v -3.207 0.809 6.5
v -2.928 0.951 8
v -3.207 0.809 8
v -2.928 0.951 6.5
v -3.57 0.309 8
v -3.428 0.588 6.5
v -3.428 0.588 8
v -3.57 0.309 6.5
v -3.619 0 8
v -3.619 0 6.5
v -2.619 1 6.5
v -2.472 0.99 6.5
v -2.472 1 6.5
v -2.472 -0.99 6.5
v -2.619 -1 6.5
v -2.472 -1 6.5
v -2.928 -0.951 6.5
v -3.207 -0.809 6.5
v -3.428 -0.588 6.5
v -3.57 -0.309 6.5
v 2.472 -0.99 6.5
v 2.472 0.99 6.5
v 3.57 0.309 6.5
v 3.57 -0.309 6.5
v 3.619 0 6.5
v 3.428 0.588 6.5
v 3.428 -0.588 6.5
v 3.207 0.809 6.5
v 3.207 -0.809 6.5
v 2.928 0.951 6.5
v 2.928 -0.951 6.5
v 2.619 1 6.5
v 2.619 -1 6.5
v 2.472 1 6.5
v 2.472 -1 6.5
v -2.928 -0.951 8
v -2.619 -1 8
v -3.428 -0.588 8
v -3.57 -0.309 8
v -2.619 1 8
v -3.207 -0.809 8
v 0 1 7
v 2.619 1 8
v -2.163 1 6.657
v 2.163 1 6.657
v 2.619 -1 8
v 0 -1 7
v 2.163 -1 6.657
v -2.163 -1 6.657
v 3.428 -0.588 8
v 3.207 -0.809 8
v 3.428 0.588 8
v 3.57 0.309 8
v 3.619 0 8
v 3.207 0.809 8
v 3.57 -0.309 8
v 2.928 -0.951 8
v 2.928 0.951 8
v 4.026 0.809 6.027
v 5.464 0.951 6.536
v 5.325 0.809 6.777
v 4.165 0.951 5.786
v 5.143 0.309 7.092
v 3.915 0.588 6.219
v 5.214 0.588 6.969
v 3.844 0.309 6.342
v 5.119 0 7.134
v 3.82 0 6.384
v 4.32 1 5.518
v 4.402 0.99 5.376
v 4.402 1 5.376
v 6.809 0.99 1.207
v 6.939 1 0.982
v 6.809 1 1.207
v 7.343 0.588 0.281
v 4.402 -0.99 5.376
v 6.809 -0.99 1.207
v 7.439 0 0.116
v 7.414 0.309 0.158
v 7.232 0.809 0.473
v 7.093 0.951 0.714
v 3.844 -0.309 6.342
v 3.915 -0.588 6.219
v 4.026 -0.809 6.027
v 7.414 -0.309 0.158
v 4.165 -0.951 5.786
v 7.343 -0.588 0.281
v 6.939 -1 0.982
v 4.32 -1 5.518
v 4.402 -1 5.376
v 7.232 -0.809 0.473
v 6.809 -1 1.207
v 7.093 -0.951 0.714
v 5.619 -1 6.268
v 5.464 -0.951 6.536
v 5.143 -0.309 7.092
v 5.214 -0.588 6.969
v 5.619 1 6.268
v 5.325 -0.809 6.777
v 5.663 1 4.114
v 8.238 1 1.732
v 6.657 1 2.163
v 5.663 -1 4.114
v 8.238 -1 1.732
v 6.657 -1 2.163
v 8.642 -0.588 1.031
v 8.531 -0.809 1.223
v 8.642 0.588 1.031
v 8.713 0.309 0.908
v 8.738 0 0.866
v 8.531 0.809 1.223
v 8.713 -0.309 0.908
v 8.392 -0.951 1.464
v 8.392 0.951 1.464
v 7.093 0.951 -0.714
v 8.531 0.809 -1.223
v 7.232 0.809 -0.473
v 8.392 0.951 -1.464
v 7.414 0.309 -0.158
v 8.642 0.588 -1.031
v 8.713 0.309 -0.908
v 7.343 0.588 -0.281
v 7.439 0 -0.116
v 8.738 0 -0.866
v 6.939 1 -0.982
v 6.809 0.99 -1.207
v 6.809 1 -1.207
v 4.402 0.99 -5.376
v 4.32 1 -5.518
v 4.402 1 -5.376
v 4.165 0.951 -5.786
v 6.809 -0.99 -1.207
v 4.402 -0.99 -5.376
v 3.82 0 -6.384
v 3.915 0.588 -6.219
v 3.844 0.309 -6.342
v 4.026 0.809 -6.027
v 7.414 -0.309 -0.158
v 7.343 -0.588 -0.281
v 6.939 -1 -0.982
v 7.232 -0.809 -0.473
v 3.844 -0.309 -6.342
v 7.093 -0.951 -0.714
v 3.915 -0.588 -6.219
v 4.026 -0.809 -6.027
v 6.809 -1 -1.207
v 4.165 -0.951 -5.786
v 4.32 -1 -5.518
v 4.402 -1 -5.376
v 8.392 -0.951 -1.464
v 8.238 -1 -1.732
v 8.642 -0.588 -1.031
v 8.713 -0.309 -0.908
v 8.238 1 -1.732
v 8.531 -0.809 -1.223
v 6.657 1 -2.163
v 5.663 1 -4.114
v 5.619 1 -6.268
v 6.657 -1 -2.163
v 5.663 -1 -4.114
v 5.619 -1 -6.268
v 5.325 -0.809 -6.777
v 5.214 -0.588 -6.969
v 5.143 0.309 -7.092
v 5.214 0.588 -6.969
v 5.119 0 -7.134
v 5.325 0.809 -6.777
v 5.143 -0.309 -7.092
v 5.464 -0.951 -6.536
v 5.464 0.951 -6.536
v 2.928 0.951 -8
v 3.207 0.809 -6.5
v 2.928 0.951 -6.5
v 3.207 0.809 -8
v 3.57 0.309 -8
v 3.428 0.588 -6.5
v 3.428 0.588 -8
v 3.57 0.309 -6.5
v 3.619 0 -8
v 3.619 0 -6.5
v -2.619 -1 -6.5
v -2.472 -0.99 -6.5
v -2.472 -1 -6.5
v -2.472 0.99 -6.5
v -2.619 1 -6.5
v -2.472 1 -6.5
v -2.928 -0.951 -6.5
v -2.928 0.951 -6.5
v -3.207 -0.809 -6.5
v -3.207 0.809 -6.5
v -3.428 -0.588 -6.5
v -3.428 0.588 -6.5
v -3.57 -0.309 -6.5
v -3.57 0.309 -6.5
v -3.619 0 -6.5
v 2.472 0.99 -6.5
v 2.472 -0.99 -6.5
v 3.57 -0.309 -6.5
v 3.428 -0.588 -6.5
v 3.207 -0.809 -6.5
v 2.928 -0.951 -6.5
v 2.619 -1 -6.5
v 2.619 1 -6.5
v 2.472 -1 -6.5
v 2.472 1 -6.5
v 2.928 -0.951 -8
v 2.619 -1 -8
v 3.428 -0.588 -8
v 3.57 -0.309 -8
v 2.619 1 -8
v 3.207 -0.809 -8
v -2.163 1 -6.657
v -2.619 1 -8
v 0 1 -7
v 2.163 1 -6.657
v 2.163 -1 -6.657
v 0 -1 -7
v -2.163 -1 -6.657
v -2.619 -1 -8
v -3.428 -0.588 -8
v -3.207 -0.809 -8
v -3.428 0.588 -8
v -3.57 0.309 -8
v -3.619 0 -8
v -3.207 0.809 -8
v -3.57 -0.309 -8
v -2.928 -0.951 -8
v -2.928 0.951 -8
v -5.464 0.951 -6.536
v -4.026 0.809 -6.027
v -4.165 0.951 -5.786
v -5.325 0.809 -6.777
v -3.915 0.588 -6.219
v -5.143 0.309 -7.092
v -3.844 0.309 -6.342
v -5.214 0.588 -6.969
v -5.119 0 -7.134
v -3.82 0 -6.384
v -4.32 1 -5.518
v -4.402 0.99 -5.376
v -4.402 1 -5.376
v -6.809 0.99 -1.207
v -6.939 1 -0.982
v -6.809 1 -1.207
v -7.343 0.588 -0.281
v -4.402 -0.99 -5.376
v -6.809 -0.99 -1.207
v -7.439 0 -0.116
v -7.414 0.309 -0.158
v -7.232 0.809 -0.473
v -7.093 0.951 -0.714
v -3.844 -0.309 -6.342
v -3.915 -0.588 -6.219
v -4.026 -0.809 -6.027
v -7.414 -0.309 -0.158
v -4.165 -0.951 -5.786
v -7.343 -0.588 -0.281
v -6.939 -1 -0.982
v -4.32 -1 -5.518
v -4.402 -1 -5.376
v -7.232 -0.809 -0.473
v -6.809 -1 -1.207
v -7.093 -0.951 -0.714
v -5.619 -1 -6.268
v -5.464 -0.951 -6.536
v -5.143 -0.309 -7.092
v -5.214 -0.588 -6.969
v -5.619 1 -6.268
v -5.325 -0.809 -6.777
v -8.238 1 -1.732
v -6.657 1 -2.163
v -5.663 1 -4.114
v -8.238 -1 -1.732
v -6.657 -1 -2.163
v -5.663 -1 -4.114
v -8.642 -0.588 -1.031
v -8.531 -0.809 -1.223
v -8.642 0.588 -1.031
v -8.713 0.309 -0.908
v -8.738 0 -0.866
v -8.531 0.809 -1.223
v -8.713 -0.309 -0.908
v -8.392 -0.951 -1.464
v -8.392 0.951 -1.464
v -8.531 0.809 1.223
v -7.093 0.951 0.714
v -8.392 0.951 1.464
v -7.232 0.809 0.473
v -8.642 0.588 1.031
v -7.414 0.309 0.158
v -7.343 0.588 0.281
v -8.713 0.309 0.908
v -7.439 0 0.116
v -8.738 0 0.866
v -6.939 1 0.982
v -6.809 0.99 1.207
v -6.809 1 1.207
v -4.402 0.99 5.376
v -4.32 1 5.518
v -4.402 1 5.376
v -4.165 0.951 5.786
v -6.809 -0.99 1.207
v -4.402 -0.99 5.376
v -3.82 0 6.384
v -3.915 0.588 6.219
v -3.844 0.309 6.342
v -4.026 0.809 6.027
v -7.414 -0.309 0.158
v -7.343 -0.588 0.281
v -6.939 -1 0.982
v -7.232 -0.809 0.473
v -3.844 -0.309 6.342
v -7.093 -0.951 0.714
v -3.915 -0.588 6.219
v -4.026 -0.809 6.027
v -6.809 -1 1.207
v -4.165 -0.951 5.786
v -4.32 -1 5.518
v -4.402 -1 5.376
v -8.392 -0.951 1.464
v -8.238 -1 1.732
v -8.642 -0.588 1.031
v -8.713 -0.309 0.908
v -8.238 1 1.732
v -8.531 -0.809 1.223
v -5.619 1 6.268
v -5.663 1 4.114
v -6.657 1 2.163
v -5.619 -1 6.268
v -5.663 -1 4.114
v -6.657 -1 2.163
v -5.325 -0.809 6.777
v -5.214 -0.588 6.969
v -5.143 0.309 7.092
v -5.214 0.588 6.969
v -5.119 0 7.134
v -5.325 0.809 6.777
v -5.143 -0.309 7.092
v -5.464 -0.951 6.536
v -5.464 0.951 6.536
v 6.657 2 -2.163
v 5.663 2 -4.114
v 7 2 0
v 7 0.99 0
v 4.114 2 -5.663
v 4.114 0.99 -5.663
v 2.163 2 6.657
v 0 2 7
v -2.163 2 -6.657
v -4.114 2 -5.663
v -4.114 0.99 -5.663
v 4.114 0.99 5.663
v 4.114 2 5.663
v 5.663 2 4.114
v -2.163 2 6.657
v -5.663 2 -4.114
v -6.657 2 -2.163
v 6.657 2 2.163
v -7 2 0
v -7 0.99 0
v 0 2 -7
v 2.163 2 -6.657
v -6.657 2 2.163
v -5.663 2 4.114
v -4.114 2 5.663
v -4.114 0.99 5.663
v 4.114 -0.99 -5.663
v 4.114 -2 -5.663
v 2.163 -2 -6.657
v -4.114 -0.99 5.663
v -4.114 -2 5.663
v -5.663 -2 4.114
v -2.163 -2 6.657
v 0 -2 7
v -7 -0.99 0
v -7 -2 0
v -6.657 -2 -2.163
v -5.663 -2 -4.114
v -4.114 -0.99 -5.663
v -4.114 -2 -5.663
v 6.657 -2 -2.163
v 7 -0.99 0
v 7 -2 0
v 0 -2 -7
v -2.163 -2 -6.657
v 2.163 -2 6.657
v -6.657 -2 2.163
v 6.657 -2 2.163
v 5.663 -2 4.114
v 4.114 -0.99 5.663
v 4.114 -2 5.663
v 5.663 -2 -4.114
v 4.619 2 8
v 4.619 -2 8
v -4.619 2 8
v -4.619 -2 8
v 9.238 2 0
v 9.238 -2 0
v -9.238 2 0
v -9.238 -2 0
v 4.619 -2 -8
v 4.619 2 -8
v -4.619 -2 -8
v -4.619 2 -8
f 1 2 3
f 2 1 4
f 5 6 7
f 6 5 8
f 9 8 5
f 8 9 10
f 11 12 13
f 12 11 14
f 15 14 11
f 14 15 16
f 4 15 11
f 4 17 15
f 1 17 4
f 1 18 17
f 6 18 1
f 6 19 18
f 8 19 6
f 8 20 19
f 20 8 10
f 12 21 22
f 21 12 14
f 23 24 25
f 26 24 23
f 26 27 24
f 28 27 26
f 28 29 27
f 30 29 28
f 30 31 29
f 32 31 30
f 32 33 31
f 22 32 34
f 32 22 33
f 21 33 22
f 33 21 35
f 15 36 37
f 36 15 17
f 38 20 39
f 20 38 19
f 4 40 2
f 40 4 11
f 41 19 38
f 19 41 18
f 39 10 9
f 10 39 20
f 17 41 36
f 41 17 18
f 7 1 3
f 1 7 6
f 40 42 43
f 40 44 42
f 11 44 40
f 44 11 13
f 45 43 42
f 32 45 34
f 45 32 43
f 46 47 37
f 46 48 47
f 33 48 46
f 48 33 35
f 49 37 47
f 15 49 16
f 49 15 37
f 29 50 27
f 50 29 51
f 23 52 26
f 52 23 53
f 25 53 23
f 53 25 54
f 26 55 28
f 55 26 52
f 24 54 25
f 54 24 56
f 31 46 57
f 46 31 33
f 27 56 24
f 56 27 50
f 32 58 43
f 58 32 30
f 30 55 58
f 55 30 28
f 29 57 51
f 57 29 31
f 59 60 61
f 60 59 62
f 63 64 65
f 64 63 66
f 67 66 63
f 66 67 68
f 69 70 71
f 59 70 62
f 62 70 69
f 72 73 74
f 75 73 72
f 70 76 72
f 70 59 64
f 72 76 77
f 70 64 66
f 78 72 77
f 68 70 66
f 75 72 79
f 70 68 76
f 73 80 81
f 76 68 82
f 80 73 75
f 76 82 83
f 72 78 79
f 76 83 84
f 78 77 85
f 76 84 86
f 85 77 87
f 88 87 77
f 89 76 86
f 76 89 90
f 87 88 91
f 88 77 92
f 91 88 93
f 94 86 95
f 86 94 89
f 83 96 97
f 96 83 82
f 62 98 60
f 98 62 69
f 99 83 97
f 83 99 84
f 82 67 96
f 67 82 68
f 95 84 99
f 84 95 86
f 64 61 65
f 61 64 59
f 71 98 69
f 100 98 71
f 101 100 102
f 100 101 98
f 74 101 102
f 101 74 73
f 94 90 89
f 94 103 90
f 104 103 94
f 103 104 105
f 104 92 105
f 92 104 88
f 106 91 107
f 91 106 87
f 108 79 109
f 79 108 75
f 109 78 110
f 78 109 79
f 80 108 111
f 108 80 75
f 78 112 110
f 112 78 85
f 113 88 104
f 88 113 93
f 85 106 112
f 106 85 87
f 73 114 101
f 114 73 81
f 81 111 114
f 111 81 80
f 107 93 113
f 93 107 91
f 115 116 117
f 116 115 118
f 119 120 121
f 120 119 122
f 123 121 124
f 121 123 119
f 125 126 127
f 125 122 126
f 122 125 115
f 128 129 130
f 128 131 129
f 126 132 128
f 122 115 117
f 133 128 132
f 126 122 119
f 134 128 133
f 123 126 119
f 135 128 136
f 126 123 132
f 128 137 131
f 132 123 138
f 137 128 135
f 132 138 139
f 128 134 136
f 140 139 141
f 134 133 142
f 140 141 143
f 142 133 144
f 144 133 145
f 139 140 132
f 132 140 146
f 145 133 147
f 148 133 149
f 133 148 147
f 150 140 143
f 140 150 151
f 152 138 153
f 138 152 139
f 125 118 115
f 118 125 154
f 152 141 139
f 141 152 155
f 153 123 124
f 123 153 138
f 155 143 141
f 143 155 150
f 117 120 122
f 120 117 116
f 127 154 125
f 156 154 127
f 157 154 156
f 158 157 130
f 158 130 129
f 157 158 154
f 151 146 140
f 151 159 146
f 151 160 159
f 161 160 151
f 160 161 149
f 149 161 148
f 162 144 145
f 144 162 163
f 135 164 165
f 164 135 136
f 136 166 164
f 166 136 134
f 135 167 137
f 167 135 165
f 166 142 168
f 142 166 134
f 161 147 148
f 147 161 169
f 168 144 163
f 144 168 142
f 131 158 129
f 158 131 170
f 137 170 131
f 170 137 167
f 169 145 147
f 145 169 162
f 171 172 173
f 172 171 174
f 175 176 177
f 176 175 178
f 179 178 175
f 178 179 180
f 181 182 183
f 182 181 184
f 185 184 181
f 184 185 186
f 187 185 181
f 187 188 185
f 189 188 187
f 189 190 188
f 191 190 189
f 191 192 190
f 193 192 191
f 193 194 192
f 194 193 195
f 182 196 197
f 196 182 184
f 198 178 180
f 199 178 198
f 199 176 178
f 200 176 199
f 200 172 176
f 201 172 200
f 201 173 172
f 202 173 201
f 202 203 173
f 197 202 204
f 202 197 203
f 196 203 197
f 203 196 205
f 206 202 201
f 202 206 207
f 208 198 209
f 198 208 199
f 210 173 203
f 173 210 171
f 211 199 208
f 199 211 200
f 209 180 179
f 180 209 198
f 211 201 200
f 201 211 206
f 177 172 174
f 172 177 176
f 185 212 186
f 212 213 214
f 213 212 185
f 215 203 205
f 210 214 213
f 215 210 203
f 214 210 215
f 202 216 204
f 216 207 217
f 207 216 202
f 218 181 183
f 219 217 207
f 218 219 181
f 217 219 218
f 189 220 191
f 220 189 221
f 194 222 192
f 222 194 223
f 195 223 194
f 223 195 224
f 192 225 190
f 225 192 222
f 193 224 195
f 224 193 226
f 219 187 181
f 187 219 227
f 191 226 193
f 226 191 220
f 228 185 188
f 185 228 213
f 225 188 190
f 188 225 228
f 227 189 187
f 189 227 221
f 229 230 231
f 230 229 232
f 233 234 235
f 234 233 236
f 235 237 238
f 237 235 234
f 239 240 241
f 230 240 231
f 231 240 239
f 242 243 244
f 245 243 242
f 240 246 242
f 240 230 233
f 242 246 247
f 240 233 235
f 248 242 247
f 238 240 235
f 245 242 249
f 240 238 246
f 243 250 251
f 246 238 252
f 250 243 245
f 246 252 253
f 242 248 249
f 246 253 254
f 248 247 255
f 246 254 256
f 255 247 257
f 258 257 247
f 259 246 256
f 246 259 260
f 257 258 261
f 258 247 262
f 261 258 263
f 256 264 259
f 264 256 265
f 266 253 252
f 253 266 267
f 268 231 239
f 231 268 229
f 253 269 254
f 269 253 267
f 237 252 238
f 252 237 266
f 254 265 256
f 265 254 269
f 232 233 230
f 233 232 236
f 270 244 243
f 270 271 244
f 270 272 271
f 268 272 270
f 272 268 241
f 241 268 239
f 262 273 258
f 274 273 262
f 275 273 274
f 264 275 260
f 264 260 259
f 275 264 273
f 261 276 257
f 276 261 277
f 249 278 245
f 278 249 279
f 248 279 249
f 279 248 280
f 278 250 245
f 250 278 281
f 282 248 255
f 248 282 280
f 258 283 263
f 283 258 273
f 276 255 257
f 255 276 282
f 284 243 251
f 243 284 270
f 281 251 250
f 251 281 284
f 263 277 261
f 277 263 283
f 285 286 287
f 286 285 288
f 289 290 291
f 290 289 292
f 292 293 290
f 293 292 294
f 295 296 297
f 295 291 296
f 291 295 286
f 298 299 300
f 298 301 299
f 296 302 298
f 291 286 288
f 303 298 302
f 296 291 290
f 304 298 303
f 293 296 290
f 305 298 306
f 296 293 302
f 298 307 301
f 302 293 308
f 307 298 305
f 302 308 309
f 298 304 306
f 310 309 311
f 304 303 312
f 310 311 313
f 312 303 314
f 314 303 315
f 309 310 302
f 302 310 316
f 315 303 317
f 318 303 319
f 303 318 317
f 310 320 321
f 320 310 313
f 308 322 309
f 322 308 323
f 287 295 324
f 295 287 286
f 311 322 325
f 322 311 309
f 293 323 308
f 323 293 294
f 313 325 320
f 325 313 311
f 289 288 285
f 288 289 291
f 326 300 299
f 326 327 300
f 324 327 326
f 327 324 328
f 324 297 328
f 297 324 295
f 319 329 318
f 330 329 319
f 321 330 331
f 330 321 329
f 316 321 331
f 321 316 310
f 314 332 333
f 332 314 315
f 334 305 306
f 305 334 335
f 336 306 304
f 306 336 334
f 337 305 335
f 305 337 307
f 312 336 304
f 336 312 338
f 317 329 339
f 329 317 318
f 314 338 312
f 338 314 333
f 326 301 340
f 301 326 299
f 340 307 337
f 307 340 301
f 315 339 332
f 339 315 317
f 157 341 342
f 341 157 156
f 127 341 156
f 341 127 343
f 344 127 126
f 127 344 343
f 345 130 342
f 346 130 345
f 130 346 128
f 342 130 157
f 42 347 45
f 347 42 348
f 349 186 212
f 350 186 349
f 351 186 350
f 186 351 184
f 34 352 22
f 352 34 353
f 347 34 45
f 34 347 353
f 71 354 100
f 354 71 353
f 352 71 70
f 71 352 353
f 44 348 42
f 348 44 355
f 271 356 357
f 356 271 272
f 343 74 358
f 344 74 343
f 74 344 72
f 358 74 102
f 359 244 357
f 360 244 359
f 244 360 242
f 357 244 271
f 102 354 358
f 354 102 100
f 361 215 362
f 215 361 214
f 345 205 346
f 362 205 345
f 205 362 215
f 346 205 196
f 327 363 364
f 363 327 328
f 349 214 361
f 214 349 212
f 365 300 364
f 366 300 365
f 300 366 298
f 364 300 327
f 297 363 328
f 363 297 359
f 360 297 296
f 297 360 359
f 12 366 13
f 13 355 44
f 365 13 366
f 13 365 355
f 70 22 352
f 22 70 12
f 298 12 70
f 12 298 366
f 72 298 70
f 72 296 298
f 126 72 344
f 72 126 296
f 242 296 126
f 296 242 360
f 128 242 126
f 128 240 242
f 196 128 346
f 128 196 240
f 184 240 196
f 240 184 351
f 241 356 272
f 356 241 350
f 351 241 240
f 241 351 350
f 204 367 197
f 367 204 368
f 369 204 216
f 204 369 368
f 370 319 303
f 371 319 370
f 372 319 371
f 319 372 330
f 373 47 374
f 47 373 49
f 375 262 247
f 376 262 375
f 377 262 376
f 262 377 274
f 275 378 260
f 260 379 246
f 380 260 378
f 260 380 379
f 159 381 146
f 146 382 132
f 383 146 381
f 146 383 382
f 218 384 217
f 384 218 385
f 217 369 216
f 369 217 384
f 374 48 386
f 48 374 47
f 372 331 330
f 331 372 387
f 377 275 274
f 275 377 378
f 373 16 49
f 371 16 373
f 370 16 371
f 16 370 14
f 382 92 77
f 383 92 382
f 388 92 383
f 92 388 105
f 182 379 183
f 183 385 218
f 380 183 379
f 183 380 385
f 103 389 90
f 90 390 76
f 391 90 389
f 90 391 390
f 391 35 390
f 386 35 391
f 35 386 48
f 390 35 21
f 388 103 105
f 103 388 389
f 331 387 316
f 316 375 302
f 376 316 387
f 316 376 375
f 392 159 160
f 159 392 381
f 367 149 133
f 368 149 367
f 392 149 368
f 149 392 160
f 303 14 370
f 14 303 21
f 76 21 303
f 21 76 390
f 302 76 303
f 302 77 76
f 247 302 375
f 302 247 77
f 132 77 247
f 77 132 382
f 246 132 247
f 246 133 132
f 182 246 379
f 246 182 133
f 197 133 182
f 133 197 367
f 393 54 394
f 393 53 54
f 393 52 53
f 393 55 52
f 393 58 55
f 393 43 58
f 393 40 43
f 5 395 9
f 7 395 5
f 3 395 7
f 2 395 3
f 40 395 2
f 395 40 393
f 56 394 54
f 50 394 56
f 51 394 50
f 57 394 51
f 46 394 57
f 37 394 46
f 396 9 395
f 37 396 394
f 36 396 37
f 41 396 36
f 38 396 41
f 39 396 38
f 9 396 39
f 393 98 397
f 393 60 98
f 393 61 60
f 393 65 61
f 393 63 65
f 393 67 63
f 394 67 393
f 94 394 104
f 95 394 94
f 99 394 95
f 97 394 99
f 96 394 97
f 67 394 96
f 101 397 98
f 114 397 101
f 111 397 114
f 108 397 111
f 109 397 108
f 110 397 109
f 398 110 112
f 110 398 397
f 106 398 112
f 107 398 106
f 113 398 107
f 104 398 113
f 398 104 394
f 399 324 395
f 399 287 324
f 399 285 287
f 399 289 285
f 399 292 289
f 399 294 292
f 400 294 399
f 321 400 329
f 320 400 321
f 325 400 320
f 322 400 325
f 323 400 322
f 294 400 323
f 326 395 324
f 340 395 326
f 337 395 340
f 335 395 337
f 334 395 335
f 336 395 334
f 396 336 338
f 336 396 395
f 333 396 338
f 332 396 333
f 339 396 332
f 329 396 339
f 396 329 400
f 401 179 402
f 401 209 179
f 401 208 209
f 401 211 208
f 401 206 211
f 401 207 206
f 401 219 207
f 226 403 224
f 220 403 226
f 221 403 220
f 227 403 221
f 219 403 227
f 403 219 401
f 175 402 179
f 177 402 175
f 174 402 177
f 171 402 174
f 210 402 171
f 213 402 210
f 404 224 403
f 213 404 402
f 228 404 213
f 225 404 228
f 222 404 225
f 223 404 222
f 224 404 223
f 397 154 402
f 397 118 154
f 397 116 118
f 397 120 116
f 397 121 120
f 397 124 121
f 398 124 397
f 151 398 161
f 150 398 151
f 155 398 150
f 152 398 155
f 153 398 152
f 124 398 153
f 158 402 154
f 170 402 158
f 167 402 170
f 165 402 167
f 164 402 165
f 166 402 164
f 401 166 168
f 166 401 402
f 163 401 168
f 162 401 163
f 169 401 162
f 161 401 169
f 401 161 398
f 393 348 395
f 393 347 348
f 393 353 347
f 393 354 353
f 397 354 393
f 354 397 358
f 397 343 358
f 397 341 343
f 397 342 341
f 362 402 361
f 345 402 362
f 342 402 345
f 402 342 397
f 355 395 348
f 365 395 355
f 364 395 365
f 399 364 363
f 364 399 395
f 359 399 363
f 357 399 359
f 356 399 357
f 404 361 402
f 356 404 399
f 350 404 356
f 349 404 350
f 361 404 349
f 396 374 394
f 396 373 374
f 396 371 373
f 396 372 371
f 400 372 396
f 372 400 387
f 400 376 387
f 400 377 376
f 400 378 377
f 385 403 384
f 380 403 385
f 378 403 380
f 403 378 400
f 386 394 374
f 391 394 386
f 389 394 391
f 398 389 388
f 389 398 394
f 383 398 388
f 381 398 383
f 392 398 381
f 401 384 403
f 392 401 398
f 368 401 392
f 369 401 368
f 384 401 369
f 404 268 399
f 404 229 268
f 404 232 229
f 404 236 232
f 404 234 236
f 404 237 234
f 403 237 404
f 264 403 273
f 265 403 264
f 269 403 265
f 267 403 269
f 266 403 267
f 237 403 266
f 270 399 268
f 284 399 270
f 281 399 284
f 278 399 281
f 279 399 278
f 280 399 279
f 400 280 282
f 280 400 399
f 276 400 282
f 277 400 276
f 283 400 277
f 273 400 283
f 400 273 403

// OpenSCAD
/* Design for a nested hexagon keychain in OpenSCAD (www.openscad.org)
    (c) M.G. Klopper, (2016,2017)
    
    This program is free software: you can redistribute it and/or modify
    it under the terms of the GNU General Public License as published by
    the Free Software Foundation, either version 3 of the License, or
    (at your option) any later version.

    This program is distributed in the hope that it will be useful,
    but WITHOUT ANY WARRANTY; without even the implied warranty of
    MERCHANTABILITY or FITNESS FOR A PARTICULAR PURPOSE.  See the
    GNU General Public License for more details.

    You should have received a copy of the GNU General Public License
    along with this program.  If not, see <http://www.gnu.org/licenses/>.
*/


// This is designed for milling operations, but with some modifications this part could be 3d printed
// A hole for a ring or string is not included in the design


flat = 16 ;                             //stock diameter, across flats
point = (flat/cos(30));                 //calculated point to point diameter
flat_radius = flat/2;                   //center to edge
point_radius = (flat_radius/cos(30));   //center to point  

slot_width = 2;                         //slot width (not necessarily milling cutter size)
slice=4;                                //thickness of hexagon
top = flat/2;                           //datum for the 'difference' calculations

circle_radius = flat_radius - ((slice-slot_width)/2);   // center hole, from calculations. slot depth is based on this
//circle_radius = 4;  // direct 

zero_x = 0;                 // datums for calculations
zero_y = 0;
zero_z = flat_radius/2;
    
$fn=20;

difference(){
    rotate([90,0,0])    translate([0,0,-slice/2])
    hexagon(flat_radius,slice); // Create the blank hexagon

        for(i= [0:5]){
            rotate([0,i*60,0])              // do on all rim edges 
                      
            slot_x(slot_width,flat_radius-circle_radius+ 0.50,  // diminsion slot according to circular cut on side, if the depth is increased the width should be too
            
                -(point_radius/2) +(slice-slot_width)/2 + slot_width/2 ,0
                , point_radius - (2 * (slice-slot_width)/2) - 2*(slot_width/2));
            
            //            (-(point_radius/2)+((slice-slot_width)/2)+slot_width/2)
            
            echo("x from center", -(point_radius/2) +(slice-slot_width)/2 + slot_width/2);
            echo("x travel", point_radius - (2 * (slice-slot_width)/2) - 2*(slot_width/2));
                        
            offset_zero_x1=0;
            offset_zero_y1=0;
            offset_zero_z1=0;
            
        };
        
        circle_depth = (slice-slot_width)/2+0.01;   // +0.01 to make it easier to edit with preview
        //and also get the inner hexagon a bit thinner than the slots on the rim. 
                
        for(i= [0:1]){
            rotate([0,0,+(i*180)])                  //front and back
            translate([0,(slice/2)-circle_depth],0)    
                rotate([-90,0,0])                   // align with part
                cylinder(r=circle_radius,circle_depth + 0.1 ,center=false); 
                // +0.1 for editing, extends the cylinder beyond the surface of the hexagon
        };
        
    };

 
 //      rotate([90,0,0])translate([0,0,-slice/2]) hexagon(3,1);    


//module hole(size, depth,x=0,y=0){
//slot(size,depth,x,y,travel_x,travel_y){    
    
    
module hexagon(radius,width)
{
    r=radius/cos(30);
linear_extrude(height=slice)
    polygon(points=[
    [r*sin(30),r*cos(30)],
    [r*sin(90),r*cos(90)],
    [r*sin(150),r*cos(150)],
    [r*sin(210),r*cos(210)],
    [r*sin(270),r*cos(270)],
    [r*sin(330),r*cos(330)]]   
    ,paths = [[0,1,2,3,4,5]]);
}

module hole(size,depth,x=0,y=0){

    translate([x,y,-depth])
    cylinder(h=depth+0.1,d=size);
};

module slot_x(size, depth, x,y, travel){
color([1,0,0,1])translate([x,y,top-depth])    
rotate([0,0,0]) slot(size,depth,travel);         
};

module slot_y(size, depth, x,y, travel){
translate([x,y,-depth])    
rotate([0,90,0]) slot(size,depth,travel);     
};

module slot(size,depth,travel){
        // +0.01 for editing, extends the shape beyond the surface of the hexagon
        
        cylinder(h=depth+0.01,d=size);

        if (travel<0){
                translate([travel,-size/2,0])
                    cube([abs(travel),size,depth+0.01],center=false);
               }
            else {
                translate([0,-size/2,0])
                    cube([abs(travel),size,depth+0.01],center=false);
        };
    
        translate([travel,0,0])
            cylinder(h=depth+0.01,d=size);

};

//EOF
